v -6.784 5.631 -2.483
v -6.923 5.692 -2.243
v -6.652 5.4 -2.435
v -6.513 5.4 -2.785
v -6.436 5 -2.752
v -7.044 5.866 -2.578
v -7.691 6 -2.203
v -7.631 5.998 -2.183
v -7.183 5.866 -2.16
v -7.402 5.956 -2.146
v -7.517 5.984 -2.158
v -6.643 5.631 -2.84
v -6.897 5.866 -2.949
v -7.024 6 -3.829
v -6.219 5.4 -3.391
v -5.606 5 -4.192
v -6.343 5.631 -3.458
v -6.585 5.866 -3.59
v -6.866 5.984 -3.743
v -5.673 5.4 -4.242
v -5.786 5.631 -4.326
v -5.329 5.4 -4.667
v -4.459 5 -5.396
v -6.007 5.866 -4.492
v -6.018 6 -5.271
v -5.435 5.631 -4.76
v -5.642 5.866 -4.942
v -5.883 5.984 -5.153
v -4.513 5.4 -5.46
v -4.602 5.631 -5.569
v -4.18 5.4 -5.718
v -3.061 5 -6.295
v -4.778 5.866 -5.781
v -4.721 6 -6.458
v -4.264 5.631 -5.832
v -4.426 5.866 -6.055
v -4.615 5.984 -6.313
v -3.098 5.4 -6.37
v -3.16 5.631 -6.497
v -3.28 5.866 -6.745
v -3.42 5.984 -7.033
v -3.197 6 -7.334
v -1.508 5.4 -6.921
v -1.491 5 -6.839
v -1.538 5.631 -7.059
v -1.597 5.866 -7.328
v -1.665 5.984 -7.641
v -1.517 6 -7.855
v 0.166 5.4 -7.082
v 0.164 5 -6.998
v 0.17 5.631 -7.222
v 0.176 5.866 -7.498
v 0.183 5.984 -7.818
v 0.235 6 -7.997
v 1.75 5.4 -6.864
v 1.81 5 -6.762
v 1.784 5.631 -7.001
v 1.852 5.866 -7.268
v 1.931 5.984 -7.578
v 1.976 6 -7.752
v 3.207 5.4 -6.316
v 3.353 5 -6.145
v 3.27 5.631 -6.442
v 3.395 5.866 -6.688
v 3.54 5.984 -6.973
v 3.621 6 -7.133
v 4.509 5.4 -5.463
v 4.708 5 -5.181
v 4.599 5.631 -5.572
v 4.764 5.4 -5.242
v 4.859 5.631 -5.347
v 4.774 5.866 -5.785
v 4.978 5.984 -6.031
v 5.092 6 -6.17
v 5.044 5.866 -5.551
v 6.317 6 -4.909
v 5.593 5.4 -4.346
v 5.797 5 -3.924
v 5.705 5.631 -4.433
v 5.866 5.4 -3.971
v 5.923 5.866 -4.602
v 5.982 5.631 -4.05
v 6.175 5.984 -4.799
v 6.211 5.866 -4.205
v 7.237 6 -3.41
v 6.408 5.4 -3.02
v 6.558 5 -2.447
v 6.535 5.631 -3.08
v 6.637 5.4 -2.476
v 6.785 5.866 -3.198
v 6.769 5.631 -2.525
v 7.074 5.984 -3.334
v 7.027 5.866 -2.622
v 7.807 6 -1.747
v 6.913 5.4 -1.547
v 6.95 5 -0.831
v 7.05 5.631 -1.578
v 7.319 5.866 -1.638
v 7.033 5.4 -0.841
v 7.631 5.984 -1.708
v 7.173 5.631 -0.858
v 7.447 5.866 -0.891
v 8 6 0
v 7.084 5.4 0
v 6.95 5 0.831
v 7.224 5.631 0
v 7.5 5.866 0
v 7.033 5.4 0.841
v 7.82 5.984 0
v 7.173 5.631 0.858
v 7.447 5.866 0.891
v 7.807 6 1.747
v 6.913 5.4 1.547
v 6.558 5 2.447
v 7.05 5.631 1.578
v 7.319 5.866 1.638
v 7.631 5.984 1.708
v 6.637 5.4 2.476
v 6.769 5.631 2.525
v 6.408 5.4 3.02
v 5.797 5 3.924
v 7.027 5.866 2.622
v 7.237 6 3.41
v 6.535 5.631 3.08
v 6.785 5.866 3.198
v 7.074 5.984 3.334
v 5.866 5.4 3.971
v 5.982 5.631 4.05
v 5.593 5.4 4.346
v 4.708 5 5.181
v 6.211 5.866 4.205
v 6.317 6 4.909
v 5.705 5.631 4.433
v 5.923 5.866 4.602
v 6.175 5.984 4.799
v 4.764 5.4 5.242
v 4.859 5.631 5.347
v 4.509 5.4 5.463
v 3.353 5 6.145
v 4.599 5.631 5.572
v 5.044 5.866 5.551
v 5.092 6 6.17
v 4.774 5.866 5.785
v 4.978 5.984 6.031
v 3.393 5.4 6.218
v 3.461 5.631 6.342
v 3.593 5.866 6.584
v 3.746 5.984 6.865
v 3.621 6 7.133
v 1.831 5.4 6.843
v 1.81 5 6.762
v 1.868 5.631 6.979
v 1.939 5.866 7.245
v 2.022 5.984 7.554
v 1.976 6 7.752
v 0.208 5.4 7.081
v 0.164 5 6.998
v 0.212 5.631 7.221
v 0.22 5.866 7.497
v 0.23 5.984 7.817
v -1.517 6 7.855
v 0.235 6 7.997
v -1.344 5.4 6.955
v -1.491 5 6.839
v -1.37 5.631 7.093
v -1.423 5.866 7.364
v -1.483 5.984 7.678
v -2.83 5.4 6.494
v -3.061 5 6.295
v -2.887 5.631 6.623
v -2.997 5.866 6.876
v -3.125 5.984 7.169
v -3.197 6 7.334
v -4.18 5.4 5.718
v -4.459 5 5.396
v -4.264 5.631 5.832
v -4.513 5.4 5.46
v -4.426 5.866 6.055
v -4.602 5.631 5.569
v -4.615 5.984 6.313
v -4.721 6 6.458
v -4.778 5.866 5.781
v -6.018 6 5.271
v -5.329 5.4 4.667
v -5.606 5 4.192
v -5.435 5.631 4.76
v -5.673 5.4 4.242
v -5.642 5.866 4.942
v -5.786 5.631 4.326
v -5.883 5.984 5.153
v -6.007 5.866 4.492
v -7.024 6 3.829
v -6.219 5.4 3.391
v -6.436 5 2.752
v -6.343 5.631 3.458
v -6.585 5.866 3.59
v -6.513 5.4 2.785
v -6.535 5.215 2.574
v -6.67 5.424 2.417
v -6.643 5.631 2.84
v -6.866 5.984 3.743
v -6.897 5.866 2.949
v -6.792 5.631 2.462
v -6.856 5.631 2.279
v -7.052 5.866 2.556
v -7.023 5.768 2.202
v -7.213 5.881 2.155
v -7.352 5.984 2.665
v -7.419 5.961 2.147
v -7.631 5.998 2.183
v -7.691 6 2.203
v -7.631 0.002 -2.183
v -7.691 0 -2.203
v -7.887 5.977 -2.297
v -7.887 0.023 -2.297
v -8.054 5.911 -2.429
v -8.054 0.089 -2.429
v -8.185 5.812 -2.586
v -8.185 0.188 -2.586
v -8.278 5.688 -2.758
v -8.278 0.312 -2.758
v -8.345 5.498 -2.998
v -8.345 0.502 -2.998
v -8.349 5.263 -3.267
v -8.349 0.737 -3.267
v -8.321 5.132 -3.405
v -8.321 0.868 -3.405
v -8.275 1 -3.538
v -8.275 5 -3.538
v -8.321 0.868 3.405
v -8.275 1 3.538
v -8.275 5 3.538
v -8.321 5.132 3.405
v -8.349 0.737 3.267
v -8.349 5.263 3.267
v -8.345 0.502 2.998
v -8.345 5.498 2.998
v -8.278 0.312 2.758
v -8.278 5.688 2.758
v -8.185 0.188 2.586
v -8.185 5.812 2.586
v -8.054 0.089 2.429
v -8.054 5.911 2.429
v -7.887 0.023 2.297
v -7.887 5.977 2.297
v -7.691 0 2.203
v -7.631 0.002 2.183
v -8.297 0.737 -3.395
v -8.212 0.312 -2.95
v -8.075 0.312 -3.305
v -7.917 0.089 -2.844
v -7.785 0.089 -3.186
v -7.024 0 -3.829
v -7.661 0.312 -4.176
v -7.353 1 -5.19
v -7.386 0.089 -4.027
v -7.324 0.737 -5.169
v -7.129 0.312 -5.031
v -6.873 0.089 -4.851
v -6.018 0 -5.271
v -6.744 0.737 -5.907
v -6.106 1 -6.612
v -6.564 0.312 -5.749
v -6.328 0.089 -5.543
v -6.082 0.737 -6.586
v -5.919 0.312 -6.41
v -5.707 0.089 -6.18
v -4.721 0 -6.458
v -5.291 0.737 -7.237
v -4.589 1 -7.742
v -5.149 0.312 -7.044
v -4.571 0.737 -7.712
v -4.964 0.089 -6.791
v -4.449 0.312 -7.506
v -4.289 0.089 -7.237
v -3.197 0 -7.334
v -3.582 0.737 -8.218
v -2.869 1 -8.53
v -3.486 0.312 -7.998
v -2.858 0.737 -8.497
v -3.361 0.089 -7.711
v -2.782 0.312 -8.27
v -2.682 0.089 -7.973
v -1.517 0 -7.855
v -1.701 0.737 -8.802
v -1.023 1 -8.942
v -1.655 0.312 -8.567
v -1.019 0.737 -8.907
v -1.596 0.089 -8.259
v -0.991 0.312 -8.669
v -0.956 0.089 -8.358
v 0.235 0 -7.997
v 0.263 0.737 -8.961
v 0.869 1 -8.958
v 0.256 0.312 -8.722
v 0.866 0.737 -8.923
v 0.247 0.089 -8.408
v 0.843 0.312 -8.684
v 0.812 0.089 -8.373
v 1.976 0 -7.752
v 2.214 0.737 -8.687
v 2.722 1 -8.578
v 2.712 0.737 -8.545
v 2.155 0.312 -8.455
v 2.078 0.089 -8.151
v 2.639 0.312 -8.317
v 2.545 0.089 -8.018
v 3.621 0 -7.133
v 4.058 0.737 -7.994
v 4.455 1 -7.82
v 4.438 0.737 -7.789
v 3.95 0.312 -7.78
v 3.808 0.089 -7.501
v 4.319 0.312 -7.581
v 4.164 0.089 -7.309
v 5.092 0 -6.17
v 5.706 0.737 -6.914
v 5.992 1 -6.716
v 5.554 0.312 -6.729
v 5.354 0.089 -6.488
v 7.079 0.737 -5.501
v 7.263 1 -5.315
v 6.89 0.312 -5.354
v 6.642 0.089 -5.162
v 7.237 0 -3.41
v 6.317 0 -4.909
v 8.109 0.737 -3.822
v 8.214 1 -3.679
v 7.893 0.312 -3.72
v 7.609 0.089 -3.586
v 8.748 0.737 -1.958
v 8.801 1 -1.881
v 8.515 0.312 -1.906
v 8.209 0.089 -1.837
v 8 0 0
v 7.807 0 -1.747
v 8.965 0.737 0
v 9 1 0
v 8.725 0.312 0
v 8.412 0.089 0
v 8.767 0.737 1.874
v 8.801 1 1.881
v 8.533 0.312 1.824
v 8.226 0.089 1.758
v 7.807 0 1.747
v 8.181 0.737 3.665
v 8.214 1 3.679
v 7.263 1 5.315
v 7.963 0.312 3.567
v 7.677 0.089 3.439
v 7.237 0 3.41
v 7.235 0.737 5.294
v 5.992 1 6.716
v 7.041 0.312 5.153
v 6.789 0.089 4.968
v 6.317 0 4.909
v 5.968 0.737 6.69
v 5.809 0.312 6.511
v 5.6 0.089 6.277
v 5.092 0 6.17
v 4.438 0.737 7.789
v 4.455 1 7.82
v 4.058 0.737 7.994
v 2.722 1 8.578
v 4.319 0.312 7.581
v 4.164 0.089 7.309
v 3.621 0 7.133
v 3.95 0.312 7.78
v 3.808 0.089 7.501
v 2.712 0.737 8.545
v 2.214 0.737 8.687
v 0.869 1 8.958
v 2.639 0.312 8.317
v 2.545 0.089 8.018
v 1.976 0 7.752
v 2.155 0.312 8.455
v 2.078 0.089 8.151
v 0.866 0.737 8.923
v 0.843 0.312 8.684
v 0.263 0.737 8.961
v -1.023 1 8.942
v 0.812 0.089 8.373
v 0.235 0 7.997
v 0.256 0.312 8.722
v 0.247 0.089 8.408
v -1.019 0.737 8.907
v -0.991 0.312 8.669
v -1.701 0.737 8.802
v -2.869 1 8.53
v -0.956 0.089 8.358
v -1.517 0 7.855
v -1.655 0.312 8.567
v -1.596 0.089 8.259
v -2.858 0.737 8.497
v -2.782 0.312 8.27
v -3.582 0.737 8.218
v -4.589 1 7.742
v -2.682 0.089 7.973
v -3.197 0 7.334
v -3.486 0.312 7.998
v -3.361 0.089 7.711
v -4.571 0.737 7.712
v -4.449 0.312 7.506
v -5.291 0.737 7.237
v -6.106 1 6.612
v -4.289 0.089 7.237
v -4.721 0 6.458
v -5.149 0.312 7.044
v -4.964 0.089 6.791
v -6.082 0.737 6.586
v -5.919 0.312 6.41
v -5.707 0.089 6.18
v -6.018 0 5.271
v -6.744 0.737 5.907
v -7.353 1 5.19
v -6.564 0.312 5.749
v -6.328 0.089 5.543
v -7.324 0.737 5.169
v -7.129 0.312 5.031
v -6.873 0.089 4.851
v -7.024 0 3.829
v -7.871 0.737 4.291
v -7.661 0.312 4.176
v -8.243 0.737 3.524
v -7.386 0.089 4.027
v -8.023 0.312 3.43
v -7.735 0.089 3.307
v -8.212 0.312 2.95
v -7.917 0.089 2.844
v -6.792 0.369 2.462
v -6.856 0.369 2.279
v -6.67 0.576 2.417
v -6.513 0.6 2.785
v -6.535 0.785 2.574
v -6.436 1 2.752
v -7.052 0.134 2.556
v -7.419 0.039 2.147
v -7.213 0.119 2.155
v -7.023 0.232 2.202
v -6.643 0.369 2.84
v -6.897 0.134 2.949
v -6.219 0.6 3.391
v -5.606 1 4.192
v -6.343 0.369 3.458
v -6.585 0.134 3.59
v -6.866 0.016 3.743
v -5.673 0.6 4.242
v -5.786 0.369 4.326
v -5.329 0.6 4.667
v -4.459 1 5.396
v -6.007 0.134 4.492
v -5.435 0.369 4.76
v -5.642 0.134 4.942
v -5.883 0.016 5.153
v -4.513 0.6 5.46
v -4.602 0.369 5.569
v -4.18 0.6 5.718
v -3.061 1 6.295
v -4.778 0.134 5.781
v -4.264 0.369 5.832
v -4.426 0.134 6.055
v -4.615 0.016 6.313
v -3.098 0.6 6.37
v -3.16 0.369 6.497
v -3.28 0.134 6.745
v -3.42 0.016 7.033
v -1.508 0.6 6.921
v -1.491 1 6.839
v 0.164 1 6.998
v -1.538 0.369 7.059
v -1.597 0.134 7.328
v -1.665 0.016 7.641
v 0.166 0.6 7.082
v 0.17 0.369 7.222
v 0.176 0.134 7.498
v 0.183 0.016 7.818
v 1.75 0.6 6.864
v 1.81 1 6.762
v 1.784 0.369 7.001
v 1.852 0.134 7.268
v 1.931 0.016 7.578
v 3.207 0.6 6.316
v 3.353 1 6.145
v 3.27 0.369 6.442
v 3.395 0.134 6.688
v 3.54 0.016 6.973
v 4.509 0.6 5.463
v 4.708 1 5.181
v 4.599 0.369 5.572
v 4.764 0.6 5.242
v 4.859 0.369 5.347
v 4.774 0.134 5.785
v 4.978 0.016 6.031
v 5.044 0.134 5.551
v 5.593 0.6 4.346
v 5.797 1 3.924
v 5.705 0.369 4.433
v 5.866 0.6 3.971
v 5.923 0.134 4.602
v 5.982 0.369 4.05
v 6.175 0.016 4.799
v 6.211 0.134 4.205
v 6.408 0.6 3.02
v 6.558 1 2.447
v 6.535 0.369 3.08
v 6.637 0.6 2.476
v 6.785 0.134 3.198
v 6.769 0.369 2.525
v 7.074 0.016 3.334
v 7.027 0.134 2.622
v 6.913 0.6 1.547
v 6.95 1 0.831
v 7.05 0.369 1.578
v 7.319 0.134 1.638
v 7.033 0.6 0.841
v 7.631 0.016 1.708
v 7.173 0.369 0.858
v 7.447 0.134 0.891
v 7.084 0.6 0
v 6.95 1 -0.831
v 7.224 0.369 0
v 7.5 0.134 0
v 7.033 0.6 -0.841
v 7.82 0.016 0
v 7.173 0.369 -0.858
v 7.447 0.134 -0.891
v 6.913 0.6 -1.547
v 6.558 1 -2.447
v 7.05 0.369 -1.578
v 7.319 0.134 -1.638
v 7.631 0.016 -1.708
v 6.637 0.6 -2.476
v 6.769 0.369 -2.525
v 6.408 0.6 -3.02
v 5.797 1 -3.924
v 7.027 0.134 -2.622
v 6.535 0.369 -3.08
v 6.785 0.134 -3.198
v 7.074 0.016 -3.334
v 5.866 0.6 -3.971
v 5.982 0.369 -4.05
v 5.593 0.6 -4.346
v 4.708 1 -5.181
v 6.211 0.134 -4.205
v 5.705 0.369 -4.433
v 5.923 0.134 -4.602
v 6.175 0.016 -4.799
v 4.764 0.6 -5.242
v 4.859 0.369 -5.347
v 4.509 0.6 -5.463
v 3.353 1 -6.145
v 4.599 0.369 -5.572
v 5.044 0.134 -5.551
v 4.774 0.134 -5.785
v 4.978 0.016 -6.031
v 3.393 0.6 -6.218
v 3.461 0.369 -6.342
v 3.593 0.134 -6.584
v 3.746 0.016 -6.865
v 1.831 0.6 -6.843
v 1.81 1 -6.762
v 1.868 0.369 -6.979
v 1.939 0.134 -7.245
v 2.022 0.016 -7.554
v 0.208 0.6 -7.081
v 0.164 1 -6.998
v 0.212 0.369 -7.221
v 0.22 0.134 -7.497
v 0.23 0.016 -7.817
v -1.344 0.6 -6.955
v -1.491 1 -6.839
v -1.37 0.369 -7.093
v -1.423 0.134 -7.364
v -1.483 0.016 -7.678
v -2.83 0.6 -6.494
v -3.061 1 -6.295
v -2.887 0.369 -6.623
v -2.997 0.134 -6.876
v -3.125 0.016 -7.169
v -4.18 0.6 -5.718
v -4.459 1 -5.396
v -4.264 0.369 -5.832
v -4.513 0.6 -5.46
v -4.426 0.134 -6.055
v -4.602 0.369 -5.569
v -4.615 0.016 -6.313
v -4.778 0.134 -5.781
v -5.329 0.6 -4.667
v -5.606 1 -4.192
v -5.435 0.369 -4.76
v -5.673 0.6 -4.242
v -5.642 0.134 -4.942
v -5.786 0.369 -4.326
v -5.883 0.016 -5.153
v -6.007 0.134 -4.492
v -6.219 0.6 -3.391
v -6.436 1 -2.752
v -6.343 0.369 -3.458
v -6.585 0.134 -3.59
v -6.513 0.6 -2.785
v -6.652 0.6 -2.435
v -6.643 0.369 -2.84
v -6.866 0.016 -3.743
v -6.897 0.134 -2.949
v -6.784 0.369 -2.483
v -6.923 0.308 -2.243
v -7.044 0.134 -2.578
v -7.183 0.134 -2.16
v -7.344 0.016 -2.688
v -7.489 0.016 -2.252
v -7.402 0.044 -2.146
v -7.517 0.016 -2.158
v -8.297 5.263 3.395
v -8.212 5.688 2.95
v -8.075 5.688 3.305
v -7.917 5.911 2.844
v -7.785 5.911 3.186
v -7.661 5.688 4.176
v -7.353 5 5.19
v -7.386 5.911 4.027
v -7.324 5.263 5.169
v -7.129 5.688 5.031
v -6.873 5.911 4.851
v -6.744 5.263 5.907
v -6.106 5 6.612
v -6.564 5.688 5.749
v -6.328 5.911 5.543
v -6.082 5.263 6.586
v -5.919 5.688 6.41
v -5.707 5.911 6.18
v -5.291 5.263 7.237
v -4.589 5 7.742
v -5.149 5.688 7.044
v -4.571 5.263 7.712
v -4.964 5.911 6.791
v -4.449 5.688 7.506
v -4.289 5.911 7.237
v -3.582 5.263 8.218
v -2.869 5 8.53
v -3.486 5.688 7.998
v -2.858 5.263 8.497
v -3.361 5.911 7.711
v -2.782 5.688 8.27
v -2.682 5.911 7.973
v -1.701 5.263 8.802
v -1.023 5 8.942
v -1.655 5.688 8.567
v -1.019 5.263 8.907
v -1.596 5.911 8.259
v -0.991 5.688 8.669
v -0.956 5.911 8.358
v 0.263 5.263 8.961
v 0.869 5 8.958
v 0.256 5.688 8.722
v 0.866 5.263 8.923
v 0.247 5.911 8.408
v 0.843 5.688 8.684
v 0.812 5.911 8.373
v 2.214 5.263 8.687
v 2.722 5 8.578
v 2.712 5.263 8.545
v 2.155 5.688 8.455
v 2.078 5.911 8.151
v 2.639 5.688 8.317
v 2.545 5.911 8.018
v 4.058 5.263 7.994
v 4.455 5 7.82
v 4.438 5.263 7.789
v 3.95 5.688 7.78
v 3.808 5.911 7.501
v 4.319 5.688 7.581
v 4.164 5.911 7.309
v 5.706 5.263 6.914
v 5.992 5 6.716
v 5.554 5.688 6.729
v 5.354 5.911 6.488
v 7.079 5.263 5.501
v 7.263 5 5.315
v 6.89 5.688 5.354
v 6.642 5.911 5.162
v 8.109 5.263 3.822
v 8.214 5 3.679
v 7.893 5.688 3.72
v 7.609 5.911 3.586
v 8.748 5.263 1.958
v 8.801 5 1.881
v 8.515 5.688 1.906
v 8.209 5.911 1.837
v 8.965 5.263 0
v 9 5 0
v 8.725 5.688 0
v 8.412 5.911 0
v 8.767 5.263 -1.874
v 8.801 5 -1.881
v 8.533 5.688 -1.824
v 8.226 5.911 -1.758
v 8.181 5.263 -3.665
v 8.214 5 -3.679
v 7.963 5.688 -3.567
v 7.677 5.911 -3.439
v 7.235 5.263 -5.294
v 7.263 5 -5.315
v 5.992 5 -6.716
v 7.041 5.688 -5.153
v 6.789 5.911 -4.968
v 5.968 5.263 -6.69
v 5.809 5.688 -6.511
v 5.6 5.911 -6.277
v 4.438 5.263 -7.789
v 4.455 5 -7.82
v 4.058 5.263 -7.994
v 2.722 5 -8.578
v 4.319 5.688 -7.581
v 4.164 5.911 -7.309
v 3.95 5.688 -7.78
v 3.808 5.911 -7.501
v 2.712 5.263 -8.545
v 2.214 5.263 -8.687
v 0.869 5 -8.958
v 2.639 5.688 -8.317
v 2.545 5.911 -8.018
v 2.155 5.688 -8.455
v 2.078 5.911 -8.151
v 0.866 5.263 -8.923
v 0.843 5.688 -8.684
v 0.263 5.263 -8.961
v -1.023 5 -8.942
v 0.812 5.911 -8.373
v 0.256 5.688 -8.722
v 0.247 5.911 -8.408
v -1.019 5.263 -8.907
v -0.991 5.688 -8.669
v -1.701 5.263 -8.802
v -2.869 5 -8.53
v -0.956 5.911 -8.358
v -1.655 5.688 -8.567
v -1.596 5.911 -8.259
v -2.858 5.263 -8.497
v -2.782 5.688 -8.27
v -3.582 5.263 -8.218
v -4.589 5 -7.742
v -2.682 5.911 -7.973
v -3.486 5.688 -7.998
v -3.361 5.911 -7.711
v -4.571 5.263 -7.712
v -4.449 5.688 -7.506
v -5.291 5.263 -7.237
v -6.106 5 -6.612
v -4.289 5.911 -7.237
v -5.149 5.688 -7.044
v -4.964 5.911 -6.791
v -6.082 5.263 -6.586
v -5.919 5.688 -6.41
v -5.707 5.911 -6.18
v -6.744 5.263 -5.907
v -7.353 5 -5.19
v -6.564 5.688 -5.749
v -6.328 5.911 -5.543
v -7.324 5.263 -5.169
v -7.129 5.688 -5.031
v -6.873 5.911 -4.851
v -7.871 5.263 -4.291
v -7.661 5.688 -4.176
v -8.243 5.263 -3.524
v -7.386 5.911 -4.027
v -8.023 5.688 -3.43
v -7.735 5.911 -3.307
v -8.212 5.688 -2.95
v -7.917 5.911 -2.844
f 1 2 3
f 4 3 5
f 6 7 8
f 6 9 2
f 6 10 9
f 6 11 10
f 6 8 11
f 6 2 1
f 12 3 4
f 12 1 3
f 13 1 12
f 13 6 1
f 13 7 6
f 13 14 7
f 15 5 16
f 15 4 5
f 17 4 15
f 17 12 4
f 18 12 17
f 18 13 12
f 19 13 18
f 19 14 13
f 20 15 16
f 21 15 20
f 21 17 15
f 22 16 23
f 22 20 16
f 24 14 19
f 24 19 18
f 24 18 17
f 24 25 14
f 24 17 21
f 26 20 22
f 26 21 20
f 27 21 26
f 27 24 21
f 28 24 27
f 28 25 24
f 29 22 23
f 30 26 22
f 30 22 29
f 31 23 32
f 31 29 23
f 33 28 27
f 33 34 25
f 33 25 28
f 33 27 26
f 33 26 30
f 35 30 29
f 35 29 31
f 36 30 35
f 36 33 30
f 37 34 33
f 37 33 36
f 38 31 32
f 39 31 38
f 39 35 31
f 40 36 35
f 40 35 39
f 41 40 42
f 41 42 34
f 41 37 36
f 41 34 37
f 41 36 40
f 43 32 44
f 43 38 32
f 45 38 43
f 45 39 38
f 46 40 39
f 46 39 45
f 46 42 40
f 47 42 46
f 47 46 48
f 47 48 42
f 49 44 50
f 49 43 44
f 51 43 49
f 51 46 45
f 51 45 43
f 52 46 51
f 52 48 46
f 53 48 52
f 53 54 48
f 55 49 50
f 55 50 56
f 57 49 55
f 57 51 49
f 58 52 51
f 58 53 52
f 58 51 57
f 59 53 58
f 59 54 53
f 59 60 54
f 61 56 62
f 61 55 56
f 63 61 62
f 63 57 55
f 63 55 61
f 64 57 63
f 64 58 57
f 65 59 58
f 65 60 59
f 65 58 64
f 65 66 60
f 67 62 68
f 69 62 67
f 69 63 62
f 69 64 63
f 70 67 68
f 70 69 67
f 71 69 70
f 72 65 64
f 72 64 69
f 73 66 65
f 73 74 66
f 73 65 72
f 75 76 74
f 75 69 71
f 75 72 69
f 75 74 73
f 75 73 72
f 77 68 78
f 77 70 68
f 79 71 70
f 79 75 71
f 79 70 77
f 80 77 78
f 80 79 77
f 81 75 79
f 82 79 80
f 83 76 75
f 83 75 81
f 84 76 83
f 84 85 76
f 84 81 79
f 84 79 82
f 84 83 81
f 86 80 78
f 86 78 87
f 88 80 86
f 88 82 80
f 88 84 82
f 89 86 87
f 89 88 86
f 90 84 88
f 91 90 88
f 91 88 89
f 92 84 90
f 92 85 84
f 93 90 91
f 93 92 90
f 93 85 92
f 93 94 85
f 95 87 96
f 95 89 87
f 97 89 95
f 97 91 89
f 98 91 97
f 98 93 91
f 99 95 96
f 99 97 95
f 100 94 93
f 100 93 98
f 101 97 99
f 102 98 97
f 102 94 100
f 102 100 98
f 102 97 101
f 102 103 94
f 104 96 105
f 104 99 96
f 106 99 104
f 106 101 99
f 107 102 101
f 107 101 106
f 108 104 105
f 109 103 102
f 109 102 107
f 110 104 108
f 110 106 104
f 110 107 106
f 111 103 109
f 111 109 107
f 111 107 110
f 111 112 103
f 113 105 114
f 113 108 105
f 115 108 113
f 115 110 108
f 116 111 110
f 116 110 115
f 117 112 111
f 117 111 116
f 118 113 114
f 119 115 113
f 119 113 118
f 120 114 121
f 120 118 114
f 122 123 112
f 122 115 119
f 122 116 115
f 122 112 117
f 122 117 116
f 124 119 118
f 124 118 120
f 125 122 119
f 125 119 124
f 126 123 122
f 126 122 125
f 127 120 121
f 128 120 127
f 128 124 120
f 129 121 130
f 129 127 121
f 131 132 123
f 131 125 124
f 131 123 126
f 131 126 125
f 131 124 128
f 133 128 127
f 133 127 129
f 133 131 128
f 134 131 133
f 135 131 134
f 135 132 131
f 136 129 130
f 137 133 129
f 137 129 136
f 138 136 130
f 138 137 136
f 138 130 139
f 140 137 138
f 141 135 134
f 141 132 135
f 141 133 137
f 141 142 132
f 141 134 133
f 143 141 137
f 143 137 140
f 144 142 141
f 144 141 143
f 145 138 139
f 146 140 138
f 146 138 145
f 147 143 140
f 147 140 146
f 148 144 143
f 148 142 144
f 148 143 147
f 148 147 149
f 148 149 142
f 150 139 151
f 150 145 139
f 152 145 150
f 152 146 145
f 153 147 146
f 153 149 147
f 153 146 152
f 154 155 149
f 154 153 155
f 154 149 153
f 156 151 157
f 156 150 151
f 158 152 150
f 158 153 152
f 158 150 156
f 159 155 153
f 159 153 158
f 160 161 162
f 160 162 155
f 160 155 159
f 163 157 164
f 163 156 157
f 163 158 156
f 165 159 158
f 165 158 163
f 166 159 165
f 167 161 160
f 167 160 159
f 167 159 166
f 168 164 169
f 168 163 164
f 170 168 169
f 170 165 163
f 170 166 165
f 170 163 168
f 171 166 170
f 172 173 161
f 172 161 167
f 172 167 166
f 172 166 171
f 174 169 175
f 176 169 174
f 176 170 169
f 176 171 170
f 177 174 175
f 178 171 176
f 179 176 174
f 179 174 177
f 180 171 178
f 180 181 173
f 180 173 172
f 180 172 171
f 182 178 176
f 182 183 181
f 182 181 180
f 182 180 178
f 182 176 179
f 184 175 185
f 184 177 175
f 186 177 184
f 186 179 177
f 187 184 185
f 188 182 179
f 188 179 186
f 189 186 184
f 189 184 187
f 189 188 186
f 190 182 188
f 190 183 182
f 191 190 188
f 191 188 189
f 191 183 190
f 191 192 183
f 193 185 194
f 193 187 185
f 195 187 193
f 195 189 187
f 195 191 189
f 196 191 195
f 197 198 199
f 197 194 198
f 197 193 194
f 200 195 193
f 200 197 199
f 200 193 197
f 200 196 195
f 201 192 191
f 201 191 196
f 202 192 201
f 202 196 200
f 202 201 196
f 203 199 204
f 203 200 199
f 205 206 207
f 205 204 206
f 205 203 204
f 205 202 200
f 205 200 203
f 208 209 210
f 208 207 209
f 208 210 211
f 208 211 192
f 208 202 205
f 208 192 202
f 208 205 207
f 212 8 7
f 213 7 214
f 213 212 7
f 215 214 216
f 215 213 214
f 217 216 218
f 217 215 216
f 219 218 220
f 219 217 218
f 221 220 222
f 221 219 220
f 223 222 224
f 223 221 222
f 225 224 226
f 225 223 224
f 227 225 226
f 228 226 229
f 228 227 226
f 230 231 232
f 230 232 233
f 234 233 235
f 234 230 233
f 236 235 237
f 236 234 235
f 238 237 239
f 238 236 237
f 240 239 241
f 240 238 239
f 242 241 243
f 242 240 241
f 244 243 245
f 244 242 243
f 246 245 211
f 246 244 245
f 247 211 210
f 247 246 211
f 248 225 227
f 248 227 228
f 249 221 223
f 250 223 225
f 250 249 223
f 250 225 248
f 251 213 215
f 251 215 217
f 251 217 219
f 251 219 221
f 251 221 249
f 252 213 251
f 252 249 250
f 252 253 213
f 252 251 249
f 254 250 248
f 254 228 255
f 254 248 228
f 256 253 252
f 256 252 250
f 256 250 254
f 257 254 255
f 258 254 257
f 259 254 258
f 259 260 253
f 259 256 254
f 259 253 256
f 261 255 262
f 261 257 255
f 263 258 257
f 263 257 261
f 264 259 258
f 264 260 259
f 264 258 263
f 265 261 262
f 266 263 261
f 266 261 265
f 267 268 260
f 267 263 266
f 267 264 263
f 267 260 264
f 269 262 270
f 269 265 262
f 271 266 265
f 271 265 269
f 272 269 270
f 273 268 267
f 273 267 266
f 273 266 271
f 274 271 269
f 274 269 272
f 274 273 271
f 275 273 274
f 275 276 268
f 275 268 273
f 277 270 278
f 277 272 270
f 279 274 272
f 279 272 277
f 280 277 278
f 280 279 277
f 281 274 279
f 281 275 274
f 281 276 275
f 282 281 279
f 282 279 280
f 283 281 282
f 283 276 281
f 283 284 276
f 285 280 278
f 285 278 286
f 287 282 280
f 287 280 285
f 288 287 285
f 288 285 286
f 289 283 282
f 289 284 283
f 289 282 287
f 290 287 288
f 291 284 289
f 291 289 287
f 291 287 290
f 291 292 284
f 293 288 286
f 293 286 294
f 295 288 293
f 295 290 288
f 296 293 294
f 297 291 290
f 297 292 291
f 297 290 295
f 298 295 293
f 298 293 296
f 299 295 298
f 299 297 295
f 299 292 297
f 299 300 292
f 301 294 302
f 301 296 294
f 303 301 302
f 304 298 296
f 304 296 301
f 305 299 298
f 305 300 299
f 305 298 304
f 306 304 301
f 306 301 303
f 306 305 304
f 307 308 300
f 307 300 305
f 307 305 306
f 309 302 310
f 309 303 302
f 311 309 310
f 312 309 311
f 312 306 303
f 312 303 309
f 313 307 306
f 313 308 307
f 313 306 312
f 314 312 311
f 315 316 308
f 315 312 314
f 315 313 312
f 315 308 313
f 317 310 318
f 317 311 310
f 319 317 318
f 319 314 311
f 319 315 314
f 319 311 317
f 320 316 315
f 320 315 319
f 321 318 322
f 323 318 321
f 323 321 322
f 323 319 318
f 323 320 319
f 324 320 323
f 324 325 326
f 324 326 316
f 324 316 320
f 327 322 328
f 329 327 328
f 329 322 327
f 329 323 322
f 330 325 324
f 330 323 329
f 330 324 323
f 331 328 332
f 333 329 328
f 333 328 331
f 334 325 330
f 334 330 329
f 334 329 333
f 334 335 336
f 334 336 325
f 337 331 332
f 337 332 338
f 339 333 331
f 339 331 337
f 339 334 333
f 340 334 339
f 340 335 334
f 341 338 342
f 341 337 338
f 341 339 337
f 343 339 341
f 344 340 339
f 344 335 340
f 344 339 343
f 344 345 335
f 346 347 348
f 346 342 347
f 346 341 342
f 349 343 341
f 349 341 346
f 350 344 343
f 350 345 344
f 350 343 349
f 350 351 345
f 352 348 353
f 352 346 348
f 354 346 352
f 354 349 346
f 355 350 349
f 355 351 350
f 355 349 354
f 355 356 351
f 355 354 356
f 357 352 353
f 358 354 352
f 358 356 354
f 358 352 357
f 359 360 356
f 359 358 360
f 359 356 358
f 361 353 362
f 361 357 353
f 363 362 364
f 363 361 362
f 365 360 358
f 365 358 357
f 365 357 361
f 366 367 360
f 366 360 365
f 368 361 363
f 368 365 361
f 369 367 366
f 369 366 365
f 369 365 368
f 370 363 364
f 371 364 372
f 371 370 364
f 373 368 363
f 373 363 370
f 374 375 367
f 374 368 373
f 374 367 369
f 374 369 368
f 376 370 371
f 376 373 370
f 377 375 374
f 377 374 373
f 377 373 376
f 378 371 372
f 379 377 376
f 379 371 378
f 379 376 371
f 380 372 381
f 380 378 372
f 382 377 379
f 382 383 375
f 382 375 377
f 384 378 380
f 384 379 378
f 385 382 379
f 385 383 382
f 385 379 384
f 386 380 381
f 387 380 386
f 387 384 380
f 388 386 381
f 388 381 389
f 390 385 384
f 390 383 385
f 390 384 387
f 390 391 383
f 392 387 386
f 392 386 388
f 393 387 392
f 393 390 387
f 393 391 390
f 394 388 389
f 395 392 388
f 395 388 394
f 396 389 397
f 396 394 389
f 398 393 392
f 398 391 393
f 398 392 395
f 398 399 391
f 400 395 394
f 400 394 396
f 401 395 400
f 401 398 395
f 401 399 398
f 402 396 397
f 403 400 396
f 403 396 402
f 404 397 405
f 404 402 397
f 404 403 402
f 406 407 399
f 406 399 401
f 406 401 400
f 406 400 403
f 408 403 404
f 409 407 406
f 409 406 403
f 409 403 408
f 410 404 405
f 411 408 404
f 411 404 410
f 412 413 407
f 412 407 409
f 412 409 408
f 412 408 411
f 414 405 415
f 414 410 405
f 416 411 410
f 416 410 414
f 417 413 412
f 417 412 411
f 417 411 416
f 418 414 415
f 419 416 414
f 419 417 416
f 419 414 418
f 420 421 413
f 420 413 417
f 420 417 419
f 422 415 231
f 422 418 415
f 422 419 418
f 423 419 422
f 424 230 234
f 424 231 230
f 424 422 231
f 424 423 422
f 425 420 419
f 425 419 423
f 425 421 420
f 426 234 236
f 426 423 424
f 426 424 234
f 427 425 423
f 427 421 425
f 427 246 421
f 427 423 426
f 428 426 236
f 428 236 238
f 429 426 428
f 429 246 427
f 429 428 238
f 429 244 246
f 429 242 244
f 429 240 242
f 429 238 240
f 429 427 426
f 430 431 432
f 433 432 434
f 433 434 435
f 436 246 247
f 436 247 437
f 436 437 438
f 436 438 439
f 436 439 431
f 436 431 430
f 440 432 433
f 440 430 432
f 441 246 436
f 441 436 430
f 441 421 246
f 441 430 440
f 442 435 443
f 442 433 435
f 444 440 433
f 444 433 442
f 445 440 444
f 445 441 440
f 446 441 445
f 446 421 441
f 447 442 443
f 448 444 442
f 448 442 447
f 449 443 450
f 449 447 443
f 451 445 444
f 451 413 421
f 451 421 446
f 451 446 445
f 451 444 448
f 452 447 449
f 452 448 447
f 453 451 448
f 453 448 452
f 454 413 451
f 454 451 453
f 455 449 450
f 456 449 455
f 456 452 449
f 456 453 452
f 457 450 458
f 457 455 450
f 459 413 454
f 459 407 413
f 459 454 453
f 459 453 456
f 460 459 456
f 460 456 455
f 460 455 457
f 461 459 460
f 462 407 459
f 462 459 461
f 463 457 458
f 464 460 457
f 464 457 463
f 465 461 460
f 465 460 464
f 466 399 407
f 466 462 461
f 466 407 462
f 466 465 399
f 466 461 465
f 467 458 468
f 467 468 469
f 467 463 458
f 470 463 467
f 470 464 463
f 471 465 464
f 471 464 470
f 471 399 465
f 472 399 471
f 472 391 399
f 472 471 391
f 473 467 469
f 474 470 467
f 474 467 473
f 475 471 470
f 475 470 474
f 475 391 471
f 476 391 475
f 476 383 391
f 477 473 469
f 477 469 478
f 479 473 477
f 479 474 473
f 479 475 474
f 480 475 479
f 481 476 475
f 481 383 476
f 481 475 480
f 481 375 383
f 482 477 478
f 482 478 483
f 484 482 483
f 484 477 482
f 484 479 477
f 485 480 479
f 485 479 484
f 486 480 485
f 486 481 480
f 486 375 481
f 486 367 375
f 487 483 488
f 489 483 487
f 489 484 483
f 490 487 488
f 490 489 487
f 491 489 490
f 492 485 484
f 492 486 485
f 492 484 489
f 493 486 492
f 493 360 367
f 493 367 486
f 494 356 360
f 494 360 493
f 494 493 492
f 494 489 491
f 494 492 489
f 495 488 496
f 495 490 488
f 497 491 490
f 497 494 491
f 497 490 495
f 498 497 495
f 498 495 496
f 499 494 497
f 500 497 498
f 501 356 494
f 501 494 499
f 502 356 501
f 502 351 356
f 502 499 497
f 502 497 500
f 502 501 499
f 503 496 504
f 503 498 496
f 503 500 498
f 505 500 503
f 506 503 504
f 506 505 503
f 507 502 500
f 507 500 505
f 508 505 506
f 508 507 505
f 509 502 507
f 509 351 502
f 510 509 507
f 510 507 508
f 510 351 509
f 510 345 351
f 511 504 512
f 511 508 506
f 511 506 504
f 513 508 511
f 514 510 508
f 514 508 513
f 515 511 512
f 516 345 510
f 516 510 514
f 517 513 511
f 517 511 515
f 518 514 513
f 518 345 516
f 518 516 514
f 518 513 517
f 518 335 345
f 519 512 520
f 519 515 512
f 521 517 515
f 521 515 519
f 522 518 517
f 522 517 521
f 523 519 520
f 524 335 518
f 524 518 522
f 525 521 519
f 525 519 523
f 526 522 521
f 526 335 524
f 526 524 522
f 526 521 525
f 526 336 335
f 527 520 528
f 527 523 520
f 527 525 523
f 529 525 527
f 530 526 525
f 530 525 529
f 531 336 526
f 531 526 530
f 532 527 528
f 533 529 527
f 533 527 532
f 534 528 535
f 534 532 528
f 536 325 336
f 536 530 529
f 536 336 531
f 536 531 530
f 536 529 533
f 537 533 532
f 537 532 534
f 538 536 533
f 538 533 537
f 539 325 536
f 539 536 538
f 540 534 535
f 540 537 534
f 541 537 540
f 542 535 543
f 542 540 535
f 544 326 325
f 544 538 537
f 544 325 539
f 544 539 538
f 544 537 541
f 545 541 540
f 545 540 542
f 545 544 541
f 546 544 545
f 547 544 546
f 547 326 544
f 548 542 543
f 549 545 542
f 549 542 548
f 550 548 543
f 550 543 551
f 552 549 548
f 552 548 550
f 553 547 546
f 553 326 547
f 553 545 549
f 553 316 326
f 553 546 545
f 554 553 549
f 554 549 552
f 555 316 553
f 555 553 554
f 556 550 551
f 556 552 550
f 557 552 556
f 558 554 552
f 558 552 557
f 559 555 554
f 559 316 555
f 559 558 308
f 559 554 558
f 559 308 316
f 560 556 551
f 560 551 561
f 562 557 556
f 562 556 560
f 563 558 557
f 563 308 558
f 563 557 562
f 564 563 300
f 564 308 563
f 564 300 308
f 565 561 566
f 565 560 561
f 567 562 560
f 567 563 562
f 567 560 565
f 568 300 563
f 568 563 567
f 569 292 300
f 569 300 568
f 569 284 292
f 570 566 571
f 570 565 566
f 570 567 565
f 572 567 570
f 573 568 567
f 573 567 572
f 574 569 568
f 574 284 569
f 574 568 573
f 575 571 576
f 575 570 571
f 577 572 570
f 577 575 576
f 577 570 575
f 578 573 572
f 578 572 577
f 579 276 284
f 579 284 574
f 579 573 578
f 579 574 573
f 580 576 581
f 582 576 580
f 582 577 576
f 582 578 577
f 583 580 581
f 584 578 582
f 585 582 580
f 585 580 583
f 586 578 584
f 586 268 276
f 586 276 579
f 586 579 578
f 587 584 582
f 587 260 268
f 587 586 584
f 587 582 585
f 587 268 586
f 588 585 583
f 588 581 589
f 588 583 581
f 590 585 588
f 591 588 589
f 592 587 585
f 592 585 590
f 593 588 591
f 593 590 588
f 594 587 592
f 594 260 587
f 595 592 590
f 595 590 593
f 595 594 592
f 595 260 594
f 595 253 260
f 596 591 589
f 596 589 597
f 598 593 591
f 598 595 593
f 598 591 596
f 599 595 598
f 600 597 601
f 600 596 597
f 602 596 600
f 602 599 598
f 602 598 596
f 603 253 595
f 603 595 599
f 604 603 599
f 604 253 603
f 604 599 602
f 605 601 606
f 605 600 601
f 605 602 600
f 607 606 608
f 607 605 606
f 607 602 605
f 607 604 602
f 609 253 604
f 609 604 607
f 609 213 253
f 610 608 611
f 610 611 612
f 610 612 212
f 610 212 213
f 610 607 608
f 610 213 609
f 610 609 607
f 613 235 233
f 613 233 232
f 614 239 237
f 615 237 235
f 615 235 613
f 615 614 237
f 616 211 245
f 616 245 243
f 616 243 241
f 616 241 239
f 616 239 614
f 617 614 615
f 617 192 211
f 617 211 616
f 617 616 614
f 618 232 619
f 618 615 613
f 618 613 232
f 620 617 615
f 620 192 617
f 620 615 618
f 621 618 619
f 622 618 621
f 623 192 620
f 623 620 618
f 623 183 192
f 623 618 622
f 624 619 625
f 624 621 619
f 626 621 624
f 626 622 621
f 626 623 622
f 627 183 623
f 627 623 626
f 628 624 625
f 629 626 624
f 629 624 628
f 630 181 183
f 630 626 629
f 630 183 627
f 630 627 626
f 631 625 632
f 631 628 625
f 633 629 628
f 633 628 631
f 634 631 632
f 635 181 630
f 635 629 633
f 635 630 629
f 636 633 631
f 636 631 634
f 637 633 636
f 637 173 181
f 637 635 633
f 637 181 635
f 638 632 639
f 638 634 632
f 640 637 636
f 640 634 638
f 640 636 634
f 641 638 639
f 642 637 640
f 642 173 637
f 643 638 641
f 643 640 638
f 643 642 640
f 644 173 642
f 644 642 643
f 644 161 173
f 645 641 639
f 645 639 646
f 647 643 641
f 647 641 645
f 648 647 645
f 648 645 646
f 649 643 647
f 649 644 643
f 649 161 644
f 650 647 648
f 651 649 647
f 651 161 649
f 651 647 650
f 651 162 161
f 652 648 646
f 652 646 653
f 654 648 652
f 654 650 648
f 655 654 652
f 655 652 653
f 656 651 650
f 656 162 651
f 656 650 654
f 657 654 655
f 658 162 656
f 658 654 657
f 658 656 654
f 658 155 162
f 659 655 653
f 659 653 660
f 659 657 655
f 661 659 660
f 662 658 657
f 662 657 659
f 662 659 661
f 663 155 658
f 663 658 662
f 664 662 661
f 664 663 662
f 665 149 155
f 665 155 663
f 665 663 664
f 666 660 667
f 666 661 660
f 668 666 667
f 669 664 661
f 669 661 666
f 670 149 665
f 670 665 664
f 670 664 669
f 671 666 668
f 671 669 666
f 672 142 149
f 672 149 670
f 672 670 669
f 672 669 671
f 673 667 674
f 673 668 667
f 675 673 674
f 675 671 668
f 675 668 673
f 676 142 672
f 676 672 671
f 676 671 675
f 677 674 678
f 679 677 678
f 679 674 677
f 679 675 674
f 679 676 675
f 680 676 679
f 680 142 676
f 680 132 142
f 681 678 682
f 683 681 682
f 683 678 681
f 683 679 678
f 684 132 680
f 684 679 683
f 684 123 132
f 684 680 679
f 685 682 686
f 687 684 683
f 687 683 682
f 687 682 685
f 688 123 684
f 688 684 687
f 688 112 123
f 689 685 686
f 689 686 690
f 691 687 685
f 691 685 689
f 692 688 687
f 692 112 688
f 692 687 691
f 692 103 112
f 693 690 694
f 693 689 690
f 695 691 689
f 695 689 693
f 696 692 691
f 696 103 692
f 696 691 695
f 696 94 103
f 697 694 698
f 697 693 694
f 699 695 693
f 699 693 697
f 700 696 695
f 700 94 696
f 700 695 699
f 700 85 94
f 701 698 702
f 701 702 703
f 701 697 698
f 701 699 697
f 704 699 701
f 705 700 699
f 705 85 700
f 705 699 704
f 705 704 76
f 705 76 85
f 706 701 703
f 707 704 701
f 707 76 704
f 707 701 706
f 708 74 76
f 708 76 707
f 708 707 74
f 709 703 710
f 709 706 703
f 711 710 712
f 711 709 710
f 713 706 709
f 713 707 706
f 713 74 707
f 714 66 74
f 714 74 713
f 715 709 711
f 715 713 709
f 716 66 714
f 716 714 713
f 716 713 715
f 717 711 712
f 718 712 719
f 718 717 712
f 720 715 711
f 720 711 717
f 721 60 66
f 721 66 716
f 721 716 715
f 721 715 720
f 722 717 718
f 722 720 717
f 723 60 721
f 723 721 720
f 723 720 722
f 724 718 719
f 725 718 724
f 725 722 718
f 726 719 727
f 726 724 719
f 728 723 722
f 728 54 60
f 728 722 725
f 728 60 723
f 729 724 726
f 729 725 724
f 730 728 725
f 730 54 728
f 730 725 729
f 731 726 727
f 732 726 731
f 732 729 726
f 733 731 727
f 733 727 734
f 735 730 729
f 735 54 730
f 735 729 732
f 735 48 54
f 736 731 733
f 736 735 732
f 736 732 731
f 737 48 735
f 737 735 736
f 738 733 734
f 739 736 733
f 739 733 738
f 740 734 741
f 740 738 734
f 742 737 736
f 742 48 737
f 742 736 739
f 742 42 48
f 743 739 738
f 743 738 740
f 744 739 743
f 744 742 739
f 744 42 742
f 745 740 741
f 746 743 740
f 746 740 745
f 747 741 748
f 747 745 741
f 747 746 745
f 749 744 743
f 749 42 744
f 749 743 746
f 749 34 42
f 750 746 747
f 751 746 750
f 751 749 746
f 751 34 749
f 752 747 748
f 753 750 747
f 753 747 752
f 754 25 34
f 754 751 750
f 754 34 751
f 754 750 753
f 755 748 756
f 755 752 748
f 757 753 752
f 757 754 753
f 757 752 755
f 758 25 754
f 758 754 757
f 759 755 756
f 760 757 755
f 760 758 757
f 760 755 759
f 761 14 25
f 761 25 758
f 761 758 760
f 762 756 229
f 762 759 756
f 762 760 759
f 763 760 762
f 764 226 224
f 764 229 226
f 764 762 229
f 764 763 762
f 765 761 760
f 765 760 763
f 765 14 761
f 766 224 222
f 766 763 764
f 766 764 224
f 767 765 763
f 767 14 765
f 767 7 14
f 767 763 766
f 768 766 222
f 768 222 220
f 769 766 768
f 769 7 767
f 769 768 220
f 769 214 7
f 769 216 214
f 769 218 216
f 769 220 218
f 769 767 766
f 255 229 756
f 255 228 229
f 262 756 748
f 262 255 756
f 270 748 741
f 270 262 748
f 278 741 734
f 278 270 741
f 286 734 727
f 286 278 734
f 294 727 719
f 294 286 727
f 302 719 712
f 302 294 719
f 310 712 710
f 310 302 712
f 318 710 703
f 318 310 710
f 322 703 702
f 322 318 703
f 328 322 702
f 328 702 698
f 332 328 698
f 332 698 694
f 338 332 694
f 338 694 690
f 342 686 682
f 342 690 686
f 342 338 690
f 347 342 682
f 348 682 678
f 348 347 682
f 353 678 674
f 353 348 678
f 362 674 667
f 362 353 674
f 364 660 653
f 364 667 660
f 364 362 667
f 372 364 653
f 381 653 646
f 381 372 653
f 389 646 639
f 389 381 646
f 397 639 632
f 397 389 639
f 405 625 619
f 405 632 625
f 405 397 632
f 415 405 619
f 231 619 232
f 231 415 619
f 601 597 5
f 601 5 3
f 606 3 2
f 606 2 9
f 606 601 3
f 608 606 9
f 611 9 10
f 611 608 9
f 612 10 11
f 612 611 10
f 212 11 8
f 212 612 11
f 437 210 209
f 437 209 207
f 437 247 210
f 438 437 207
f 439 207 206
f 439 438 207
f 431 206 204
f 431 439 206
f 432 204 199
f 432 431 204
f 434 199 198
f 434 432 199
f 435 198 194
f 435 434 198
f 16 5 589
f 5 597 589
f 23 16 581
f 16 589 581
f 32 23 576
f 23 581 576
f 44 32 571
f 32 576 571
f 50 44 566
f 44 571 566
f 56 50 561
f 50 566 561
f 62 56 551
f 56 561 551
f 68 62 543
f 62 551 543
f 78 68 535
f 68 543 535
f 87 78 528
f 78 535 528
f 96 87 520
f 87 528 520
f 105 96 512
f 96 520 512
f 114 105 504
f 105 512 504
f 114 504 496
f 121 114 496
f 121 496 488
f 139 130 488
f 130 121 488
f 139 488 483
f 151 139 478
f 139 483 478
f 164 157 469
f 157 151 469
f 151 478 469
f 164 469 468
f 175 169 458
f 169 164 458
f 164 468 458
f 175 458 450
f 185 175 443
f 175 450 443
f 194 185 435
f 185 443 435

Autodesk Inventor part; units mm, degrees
ref_plane "YZ Plane" through (0, 0, 0) normal (1, 0, 0) x (0, 1, 0)
ref_plane "XZ Plane" through (0, 0, 0) normal (0, 1, 0) x (-1, 0, 0)
ref_plane "XY Plane" through (0, 0, 0) normal (0, 0, 1) x (1, 0, 0)
sketch "Sketch1" plane through (0, 0, 0) normal (0, 1, 0) x (-1, 0, 0)
  circle A0 centre (0, 0) radius 7
  circle A1 centre (0, 0) radius 9
  line L0 (7, 0) -> (9, 0)
  line L1 (9, 0) -> (8.6528, -2.4758)
  line L2 (9, 0) -> (8.6528, 2.4758)
  line L3 (8.6528, 2.4758) -> (0, 0)
  line L4 (0, 0) -> (8.6528, -2.4758)
  point P0 (6.7299, -1.9256)
  point P1 (6.7299, 1.9256)
  dimension "d0" = 14
  dimension "d1" = 18
  dimension "d2" = 2.5
  dimension "d3" = 2.5
extrude "Extrusion1" add sketch "Sketch1" along normal blind 6 contours A0 L4 A1 L3
fillet "Fillet1" radius 1 8 edges at (7, 0, 0) (9, 0, 0) (9, 6, 0) (7, 6, 0) (-8.6528, 3, -2.4758) (-6.7299, 3, -1.9256) (-8.6528, 3, 2.4758) (-6.7299, 3, 1.9256)
properties part number "CableRing"
